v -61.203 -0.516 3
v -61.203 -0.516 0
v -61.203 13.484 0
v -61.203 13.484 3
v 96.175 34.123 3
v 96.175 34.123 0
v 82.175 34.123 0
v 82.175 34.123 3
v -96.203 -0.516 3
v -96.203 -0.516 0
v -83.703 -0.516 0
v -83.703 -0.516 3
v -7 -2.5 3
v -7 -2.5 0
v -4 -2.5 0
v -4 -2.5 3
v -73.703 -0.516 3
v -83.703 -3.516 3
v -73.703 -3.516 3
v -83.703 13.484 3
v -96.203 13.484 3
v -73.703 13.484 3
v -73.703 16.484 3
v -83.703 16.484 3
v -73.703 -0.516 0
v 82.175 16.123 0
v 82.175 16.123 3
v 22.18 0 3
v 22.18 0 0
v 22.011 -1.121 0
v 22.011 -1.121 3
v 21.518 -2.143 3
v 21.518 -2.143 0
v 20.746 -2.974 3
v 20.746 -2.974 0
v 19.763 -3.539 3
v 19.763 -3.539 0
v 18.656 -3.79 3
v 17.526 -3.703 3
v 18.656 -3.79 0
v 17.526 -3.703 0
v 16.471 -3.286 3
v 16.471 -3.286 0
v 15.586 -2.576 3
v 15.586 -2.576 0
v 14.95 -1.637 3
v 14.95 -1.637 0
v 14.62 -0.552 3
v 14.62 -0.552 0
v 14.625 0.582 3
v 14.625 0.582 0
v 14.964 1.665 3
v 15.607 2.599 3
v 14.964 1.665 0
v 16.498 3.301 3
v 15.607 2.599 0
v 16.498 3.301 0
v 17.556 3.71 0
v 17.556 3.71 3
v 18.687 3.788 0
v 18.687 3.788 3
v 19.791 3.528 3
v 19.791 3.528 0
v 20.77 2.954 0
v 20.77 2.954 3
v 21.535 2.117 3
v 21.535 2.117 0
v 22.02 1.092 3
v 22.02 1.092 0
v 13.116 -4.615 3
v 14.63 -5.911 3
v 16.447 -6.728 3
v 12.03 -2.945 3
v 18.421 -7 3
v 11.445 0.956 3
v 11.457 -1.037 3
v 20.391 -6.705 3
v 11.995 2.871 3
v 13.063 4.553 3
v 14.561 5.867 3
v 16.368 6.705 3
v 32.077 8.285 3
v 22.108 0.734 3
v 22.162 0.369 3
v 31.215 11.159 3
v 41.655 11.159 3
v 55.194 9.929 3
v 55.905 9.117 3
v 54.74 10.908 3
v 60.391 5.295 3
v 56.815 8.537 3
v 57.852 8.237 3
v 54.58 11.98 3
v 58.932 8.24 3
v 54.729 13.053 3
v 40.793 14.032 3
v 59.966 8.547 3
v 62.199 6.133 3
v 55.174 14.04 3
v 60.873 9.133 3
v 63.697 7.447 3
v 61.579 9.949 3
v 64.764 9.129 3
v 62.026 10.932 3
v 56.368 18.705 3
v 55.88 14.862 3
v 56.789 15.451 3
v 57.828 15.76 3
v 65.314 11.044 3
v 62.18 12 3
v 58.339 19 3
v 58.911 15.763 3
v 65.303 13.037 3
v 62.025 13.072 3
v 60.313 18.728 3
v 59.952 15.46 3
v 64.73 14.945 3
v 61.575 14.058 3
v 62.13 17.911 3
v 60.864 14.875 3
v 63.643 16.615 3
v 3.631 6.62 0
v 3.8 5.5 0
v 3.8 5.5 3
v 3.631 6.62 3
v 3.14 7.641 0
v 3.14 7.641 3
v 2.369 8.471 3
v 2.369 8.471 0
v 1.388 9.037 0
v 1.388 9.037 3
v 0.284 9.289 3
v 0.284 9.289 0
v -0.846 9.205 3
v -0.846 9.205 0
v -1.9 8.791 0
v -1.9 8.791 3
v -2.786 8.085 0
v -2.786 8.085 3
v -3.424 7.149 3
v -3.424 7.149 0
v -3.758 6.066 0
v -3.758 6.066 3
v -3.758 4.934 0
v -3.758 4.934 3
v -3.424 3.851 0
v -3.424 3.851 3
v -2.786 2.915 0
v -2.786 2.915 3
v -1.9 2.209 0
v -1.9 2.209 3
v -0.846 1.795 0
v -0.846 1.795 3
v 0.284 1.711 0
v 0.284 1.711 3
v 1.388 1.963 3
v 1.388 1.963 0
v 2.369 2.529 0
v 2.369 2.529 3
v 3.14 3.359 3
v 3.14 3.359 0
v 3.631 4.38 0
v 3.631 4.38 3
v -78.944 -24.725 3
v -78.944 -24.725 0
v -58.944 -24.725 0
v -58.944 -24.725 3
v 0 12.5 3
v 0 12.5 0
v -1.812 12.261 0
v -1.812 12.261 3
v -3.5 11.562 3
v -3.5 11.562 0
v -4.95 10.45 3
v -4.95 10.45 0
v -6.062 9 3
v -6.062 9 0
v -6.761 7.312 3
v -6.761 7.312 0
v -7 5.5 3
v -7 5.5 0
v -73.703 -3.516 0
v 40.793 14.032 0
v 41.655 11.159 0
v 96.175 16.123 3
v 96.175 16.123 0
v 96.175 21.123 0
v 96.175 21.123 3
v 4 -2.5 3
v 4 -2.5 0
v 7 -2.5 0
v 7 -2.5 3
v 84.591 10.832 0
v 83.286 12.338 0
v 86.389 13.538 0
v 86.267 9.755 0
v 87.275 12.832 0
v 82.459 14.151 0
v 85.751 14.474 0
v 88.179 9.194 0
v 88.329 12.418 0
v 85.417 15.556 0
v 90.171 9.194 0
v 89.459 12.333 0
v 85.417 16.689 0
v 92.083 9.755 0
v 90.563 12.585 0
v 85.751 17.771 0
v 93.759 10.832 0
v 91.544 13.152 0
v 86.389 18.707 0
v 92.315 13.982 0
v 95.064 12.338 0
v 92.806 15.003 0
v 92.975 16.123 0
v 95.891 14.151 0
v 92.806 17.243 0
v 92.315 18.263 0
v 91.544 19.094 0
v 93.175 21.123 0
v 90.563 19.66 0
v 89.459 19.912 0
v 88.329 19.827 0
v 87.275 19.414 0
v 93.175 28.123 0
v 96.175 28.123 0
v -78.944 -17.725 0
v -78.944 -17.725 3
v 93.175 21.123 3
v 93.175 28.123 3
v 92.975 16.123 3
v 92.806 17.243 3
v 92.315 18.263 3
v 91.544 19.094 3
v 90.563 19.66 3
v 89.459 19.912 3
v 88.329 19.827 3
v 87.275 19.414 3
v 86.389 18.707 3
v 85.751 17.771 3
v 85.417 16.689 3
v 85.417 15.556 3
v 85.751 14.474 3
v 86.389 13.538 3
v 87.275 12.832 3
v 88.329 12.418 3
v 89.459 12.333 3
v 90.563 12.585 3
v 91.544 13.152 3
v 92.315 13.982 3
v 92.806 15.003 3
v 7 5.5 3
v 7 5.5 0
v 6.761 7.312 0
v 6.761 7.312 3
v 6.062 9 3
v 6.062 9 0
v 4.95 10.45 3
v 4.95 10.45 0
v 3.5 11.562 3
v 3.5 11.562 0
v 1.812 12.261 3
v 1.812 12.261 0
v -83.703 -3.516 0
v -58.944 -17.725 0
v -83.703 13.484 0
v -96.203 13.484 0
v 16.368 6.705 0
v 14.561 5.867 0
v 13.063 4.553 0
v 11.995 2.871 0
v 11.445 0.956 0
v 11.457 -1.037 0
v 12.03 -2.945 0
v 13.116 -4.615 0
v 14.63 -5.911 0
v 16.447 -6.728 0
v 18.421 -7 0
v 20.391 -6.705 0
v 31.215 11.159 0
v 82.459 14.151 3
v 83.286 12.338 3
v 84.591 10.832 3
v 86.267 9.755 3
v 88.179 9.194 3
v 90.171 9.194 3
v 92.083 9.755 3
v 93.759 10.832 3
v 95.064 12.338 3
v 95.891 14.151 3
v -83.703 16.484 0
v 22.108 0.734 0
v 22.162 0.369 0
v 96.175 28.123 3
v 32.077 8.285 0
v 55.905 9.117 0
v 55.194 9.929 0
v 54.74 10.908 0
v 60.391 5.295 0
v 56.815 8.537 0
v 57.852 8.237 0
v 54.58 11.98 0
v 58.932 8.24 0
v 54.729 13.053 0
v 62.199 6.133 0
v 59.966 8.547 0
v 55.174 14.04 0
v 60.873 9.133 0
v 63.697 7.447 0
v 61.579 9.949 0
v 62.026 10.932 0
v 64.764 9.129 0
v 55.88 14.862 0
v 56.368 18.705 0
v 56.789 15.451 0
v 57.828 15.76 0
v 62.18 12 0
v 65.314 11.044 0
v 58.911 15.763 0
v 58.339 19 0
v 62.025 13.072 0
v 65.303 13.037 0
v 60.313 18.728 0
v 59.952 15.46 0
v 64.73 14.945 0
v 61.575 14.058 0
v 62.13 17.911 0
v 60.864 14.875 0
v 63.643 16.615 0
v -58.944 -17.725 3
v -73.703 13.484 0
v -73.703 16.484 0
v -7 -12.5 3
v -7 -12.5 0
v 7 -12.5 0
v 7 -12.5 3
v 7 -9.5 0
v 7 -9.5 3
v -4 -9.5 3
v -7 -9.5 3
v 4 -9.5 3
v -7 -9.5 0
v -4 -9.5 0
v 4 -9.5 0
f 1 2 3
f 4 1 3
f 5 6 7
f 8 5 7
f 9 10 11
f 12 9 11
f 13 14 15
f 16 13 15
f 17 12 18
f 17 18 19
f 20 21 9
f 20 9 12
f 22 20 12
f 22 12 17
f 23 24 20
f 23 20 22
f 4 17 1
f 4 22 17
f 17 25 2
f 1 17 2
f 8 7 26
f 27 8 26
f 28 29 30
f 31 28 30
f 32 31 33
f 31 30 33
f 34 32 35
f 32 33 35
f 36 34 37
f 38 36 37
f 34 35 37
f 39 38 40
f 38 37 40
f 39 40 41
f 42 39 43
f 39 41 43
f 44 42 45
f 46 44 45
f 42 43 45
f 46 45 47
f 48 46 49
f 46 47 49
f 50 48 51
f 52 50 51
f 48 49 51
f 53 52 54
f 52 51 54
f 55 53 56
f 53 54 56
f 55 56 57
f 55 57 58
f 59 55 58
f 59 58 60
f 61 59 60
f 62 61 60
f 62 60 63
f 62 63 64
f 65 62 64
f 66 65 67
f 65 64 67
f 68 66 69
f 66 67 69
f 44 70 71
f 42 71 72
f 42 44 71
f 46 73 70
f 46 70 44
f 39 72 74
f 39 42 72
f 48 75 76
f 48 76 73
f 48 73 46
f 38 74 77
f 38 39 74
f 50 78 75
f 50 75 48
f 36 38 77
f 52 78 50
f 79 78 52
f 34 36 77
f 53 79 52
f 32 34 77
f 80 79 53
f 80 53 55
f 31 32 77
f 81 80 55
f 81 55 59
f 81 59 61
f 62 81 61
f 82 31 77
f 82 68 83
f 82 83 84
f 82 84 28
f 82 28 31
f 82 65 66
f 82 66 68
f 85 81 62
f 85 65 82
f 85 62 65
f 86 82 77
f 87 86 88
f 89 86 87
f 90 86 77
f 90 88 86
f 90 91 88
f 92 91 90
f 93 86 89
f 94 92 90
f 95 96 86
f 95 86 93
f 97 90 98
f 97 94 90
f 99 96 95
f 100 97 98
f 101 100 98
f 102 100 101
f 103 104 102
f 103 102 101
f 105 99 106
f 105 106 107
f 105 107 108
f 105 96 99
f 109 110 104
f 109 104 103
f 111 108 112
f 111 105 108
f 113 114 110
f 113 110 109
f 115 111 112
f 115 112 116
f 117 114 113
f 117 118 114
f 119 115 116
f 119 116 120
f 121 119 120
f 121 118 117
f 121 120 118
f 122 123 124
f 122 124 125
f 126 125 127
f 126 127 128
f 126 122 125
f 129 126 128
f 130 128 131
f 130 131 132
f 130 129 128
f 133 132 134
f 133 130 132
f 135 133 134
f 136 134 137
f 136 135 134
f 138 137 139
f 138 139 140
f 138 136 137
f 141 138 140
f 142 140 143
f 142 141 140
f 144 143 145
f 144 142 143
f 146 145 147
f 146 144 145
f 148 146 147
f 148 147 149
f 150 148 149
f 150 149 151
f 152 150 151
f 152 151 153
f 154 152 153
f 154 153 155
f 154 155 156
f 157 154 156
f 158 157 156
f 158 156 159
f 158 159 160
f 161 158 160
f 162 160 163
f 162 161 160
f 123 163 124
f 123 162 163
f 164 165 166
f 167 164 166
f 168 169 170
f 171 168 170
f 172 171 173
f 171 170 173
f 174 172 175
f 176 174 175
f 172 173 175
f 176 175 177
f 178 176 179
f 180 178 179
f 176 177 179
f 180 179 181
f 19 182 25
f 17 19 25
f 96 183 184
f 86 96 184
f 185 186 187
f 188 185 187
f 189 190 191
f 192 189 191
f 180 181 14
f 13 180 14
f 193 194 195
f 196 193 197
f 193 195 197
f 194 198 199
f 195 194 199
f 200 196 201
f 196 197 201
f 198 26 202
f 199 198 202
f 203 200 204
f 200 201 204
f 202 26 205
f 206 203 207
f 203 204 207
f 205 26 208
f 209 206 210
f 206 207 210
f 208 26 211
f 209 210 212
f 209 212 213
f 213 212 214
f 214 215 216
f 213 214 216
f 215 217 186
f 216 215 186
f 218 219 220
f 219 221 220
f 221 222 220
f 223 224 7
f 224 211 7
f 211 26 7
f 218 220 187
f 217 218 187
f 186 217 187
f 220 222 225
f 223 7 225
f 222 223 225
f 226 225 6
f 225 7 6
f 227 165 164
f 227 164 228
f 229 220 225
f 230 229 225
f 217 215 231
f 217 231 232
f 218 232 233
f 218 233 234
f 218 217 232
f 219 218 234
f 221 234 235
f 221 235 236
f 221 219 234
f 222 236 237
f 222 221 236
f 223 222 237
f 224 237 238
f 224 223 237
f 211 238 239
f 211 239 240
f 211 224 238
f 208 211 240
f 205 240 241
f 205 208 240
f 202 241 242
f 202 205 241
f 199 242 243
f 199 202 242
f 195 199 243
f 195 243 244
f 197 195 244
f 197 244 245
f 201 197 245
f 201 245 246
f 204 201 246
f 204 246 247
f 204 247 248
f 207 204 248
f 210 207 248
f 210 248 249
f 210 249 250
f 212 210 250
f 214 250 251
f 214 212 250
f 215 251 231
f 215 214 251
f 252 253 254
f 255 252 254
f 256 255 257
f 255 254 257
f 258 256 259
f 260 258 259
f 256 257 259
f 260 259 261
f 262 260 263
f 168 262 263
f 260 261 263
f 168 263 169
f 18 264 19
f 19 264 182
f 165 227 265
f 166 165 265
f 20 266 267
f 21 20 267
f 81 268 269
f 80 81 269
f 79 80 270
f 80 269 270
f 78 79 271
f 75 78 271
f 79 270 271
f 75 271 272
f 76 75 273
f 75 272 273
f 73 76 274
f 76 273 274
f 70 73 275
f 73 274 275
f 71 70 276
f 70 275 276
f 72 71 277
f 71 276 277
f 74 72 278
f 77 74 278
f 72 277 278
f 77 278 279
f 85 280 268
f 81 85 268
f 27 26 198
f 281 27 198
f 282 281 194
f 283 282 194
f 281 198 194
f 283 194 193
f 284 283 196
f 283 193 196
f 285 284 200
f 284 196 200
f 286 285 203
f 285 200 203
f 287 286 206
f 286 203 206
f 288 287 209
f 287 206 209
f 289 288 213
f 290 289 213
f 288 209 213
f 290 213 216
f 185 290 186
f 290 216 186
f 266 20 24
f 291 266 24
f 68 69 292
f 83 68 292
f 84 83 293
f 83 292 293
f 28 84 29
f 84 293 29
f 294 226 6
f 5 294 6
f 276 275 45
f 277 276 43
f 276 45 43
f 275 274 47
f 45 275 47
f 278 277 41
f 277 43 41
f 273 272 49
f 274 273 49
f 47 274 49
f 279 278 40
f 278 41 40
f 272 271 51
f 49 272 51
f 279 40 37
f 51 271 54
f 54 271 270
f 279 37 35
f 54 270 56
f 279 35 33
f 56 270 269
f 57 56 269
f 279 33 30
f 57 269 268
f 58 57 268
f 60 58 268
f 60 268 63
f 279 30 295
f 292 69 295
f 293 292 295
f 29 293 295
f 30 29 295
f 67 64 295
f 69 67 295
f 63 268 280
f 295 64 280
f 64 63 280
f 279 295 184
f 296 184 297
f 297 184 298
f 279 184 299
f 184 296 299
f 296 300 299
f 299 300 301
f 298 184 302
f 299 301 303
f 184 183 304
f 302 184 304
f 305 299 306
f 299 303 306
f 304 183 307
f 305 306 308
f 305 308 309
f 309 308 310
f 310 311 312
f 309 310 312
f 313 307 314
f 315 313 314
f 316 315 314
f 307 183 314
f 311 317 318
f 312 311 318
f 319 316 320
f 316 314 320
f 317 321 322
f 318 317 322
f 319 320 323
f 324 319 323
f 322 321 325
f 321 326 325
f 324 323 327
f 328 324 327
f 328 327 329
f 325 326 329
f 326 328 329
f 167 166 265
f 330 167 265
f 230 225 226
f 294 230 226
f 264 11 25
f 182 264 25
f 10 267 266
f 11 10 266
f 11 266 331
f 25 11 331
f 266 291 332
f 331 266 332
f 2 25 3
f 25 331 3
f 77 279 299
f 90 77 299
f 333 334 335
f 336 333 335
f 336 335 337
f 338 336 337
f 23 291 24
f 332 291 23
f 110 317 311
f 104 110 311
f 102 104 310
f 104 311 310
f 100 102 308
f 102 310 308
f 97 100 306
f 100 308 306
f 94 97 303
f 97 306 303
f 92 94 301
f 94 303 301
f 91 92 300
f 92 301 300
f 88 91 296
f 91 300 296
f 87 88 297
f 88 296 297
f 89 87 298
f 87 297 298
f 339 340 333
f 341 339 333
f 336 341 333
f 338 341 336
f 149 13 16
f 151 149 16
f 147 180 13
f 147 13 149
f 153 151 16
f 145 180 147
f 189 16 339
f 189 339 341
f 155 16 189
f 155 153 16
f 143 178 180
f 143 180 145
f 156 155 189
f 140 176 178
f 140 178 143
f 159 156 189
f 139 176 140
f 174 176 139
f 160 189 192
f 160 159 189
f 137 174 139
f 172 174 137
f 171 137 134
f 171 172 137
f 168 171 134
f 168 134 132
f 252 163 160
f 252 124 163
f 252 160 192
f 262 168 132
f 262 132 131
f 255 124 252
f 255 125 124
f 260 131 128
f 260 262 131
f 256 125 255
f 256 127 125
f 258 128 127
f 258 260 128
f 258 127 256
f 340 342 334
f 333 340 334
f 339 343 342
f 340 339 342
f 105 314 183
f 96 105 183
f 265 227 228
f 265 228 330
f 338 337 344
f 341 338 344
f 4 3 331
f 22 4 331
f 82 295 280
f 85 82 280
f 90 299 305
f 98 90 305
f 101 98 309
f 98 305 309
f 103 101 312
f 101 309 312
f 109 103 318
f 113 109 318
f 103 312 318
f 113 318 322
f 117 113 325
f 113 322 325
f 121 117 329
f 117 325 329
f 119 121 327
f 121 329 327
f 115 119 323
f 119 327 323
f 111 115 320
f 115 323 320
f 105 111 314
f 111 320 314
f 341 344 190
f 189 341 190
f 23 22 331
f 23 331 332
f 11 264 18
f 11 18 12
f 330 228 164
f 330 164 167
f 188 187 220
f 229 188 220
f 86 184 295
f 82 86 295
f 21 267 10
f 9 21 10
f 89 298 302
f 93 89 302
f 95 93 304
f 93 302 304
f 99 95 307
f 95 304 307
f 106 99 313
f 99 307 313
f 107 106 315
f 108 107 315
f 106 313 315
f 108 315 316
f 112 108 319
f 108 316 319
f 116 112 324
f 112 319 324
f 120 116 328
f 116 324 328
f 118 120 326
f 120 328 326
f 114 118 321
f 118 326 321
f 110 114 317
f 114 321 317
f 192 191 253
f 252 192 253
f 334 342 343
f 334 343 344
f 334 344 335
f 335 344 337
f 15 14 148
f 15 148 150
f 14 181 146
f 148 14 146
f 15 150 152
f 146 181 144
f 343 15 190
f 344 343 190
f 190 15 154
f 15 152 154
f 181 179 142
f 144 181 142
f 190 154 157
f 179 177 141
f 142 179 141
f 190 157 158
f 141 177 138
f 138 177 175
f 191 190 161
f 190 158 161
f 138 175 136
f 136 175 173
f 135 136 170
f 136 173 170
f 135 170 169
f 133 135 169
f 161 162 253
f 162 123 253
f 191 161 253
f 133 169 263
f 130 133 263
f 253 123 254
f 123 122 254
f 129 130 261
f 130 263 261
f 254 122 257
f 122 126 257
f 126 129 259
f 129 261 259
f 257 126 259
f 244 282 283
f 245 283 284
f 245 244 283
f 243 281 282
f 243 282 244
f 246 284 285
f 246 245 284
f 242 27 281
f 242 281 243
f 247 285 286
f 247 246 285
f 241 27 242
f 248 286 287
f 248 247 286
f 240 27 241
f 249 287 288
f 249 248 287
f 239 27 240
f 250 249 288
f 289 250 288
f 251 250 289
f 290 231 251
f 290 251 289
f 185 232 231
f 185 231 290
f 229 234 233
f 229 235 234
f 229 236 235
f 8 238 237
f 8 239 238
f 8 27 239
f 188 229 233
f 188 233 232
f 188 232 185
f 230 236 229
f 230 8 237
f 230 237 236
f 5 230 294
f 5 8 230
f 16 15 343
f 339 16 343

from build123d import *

# Parameters (mm, degrees)
F0_R     = 3.8
F1_DEPTH = 3
F3_DEPTH = 3
F4_R     = 3.8
F5_DEPTH = 3
F6_W     = 20
F6_H     = 7
F7_DEPTH = 3
F6_W_2   = 10
F6_H_2   = 3


with BuildPart() as f1:
    # F0 (on Top) → F1 (new body)
    with BuildSketch(Plane.XY):
        with BuildLine():
            ThreePointArc((7, 5.5), (0, -1.5), (-7, 5.5))
            Line((-7, 5.5), (-7, -2.5))
            Line((-7, -2.5), (-4, -2.5))
            Line((-4, -2.5), (-4, -9.5))
            Line((-4, -9.5), (-7, -9.5))
            Line((-7, -9.5), (-7, -12.5))
            Line((-7, -12.5), (7, -12.5))
            Line((7, -12.5), (7, -9.5))
            Line((7, -9.5), (4, -9.5))
            Line((4, -9.5), (4, -2.5))
            Line((4, -2.5), (7, -2.5))
            Line((7, -2.5), (7, 5.5))
        make_face()
        with BuildLine():
            ThreePointArc((7, 5.5), (4.9497474683, 10.4497474683), (0, 12.5))
            ThreePointArc((0, 12.5), (-4.9497474683, 10.4497474683), (-7, 5.5))
            ThreePointArc((-7, 5.5), (0, -1.5), (7, 5.5))
        make_face()
        with Locations((0, 5.5)):
            Circle(F0_R, mode=Mode.SUBTRACT)
    extrude(amount=F1_DEPTH)


with BuildPart() as f3:
    # F2 (on Top) → F3 (new body)
    with BuildSketch(Plane.XY):
        with BuildLine():
            Line((51.6750069835, 9.988564801), (25.0845749766, 2.011435199))
            ThreePointArc((25.0845749766, 2.011435199), (25.3055937485, 1.0164920128), (25.37979098, 0))
            ThreePointArc((25.37979098, 0), (23.995841478, -4.1785137075), (20.391226179, -6.7047839965))
            Line((20.391226179, -6.7047839965), (60.391226179, 5.2952160035))
            ThreePointArc((60.391226179, 5.2952160035), (55.0610922188, 5.8367023005), (51.6750069835, 9.988564801))
        make_face()
        with BuildLine():
            ThreePointArc((25.37979098, 0), (25.3055937485, 1.0164920128), (25.0845749766, 2.011435199))
            ThreePointArc((25.0845749766, 2.011435199), (21.6984897413, 6.1632976995), (16.368355781, 6.7047839965))
            ThreePointArc((16.368355781, 6.7047839965), (11.6750069835, -2.011435199), (20.391226179, -6.7047839965))
            ThreePointArc((20.391226179, -6.7047839965), (23.995841478, -4.1785137075), (25.37979098, 0))
        make_face()
        with BuildLine():
            ThreePointArc((22.17979098, 0), (14.6200694771, -0.5518099498), (22.0195308639, 1.0919219652))
            ThreePointArc((22.0195308639, 1.0919219652), (22.1395124829, 0.5518099498), (22.17979098, 0))
        make_face(mode=Mode.SUBTRACT)
        with BuildLine():
            ThreePointArc((56.368355781, 18.7047839965), (52.2164932806, 15.3186987612), (51.6750069835, 9.988564801))
            ThreePointArc((51.6750069835, 9.988564801), (55.0610922188, 5.8367023005), (60.391226179, 5.2952160035))
            ThreePointArc((60.391226179, 5.2952160035), (63.995841478, 7.8214862925), (65.37979098, 12))
            ThreePointArc((65.37979098, 12), (62.5583046875, 17.616050498), (56.368355781, 18.7047839965))
        make_face()
        with BuildLine():
            ThreePointArc((62.17979098, 12), (58.9316009298, 8.2402784971), (54.7400510962, 10.9080780348))
            ThreePointArc((54.7400510962, 10.9080780348), (57.8279810302, 15.7597215029), (62.17979098, 12))
        make_face(mode=Mode.SUBTRACT)
        with BuildLine():
            ThreePointArc((16.368355781, 6.7047839965), (21.6984897413, 6.1632976995), (25.0845749766, 2.011435199))
            Line((25.0845749766, 2.011435199), (51.6750069835, 9.988564801))
            ThreePointArc((51.6750069835, 9.988564801), (52.2164932806, 15.3186987612), (56.368355781, 18.7047839965))
            Line((56.368355781, 18.7047839965), (40.7929260542, 14.0321550785))
            Line((40.7929260542, 14.0321550785), (41.6549697109, 11.1586762228))
            Line((41.6549697109, 11.1586762228), (32.0767068587, 8.2851973672))
            Line((32.0767068587, 8.2851973672), (31.214663202, 11.1586762228))
            Line((31.214663202, 11.1586762228), (16.368355781, 6.7047839965))
        make_face()
    extrude(amount=F3_DEPTH)


with BuildPart() as f5:
    # F4 (on Top) → F5 (new body)
    with BuildSketch(Plane.XY):
        with BuildLine():
            ThreePointArc((94.0739545167, 21.1227408759), (95.6283794194, 18.8344878775), (96.1749750311, 16.1227408759))
            Line((96.1749750311, 16.1227408759), (96.1749750311, 21.1227408759))
            Line((96.1749750311, 21.1227408759), (94.0739545167, 21.1227408759))
        make_face()
        with BuildLine():
            ThreePointArc((82.1749750311, 16.1227408759), (89.1749750311, 9.1227408759), (96.1749750311, 16.1227408759))
            ThreePointArc((96.1749750311, 16.1227408759), (95.6283794194, 18.8344878775), (94.0739545167, 21.1227408759))
            Line((94.0739545167, 21.1227408759), (93.1749750311, 21.1227408759))
            Line((93.1749750311, 21.1227408759), (93.1749750311, 21.8673035224))
            ThreePointArc((93.1749750311, 21.8673035224), (85.9346046819, 22.3275776989), (82.1749750311, 16.1227408759))
        make_face()
        with Locations((89.1749750311, 16.1227408759)):
            Circle(F4_R, mode=Mode.SUBTRACT)
        with BuildLine():
            Line((82.1749750311, 34.1227408759), (82.1749750311, 16.1227408759))
            ThreePointArc((82.1749750311, 16.1227408759), (85.9346046819, 22.3275776989), (93.1749750311, 21.8673035224))
            Line((93.1749750311, 21.8673035224), (93.1749750311, 28.1227408759))
            Line((93.1749750311, 28.1227408759), (96.1749750311, 28.1227408759))
            Line((96.1749750311, 28.1227408759), (96.1749750311, 34.1227408759))
            Line((96.1749750311, 34.1227408759), (82.1749750311, 34.1227408759))
        make_face()
    extrude(amount=F5_DEPTH)


with BuildPart() as f7:
    # F6 (on Top) → F7 (new body)
    with BuildSketch(Plane.XY):
        with Locations((-68.9444036782, -21.2251242399)):
            Rectangle(F6_W, F6_H)
    extrude(amount=F7_DEPTH)


with BuildPart() as f7b:
    # F6 (on Top) → F7, piece 2 (new body)
    with BuildSketch(Plane.XY):
        Polygon((-73.7027868629, -0.5160745028), (-61.2027868629, -0.5160745028), (-61.2027868629, 13.4839254972), (-73.7027868629, 13.4839254972), (-73.7027868629, 10.4839254972), (-83.7027868629, 10.4839254972), (-83.7027868629, 13.4839254972), (-96.2027868629, 13.4839254972), (-96.2027868629, -0.5160745028), (-83.7027868629, -0.5160745028), (-83.7027868629, 2.4839254972), (-73.7027868629, 2.4839254972), align=None)
        with Locations((-78.7027868629, 0.9839254972)):
            Rectangle(F6_W_2, F6_H_2)
        with Locations((-78.7027868629, -2.0160745028)):
            Rectangle(F6_W_2, F6_H_2)
        with Locations((-78.7027868629, 14.9839254972)):
            Rectangle(F6_W_2, F6_H_2)
        with Locations((-78.7027868629, 11.9839254972)):
            Rectangle(F6_W_2, F6_H_2)
    extrude(amount=F7_DEPTH)


solid = Compound([f1.part, f3.part, f5.part, f7.part, f7b.part])
